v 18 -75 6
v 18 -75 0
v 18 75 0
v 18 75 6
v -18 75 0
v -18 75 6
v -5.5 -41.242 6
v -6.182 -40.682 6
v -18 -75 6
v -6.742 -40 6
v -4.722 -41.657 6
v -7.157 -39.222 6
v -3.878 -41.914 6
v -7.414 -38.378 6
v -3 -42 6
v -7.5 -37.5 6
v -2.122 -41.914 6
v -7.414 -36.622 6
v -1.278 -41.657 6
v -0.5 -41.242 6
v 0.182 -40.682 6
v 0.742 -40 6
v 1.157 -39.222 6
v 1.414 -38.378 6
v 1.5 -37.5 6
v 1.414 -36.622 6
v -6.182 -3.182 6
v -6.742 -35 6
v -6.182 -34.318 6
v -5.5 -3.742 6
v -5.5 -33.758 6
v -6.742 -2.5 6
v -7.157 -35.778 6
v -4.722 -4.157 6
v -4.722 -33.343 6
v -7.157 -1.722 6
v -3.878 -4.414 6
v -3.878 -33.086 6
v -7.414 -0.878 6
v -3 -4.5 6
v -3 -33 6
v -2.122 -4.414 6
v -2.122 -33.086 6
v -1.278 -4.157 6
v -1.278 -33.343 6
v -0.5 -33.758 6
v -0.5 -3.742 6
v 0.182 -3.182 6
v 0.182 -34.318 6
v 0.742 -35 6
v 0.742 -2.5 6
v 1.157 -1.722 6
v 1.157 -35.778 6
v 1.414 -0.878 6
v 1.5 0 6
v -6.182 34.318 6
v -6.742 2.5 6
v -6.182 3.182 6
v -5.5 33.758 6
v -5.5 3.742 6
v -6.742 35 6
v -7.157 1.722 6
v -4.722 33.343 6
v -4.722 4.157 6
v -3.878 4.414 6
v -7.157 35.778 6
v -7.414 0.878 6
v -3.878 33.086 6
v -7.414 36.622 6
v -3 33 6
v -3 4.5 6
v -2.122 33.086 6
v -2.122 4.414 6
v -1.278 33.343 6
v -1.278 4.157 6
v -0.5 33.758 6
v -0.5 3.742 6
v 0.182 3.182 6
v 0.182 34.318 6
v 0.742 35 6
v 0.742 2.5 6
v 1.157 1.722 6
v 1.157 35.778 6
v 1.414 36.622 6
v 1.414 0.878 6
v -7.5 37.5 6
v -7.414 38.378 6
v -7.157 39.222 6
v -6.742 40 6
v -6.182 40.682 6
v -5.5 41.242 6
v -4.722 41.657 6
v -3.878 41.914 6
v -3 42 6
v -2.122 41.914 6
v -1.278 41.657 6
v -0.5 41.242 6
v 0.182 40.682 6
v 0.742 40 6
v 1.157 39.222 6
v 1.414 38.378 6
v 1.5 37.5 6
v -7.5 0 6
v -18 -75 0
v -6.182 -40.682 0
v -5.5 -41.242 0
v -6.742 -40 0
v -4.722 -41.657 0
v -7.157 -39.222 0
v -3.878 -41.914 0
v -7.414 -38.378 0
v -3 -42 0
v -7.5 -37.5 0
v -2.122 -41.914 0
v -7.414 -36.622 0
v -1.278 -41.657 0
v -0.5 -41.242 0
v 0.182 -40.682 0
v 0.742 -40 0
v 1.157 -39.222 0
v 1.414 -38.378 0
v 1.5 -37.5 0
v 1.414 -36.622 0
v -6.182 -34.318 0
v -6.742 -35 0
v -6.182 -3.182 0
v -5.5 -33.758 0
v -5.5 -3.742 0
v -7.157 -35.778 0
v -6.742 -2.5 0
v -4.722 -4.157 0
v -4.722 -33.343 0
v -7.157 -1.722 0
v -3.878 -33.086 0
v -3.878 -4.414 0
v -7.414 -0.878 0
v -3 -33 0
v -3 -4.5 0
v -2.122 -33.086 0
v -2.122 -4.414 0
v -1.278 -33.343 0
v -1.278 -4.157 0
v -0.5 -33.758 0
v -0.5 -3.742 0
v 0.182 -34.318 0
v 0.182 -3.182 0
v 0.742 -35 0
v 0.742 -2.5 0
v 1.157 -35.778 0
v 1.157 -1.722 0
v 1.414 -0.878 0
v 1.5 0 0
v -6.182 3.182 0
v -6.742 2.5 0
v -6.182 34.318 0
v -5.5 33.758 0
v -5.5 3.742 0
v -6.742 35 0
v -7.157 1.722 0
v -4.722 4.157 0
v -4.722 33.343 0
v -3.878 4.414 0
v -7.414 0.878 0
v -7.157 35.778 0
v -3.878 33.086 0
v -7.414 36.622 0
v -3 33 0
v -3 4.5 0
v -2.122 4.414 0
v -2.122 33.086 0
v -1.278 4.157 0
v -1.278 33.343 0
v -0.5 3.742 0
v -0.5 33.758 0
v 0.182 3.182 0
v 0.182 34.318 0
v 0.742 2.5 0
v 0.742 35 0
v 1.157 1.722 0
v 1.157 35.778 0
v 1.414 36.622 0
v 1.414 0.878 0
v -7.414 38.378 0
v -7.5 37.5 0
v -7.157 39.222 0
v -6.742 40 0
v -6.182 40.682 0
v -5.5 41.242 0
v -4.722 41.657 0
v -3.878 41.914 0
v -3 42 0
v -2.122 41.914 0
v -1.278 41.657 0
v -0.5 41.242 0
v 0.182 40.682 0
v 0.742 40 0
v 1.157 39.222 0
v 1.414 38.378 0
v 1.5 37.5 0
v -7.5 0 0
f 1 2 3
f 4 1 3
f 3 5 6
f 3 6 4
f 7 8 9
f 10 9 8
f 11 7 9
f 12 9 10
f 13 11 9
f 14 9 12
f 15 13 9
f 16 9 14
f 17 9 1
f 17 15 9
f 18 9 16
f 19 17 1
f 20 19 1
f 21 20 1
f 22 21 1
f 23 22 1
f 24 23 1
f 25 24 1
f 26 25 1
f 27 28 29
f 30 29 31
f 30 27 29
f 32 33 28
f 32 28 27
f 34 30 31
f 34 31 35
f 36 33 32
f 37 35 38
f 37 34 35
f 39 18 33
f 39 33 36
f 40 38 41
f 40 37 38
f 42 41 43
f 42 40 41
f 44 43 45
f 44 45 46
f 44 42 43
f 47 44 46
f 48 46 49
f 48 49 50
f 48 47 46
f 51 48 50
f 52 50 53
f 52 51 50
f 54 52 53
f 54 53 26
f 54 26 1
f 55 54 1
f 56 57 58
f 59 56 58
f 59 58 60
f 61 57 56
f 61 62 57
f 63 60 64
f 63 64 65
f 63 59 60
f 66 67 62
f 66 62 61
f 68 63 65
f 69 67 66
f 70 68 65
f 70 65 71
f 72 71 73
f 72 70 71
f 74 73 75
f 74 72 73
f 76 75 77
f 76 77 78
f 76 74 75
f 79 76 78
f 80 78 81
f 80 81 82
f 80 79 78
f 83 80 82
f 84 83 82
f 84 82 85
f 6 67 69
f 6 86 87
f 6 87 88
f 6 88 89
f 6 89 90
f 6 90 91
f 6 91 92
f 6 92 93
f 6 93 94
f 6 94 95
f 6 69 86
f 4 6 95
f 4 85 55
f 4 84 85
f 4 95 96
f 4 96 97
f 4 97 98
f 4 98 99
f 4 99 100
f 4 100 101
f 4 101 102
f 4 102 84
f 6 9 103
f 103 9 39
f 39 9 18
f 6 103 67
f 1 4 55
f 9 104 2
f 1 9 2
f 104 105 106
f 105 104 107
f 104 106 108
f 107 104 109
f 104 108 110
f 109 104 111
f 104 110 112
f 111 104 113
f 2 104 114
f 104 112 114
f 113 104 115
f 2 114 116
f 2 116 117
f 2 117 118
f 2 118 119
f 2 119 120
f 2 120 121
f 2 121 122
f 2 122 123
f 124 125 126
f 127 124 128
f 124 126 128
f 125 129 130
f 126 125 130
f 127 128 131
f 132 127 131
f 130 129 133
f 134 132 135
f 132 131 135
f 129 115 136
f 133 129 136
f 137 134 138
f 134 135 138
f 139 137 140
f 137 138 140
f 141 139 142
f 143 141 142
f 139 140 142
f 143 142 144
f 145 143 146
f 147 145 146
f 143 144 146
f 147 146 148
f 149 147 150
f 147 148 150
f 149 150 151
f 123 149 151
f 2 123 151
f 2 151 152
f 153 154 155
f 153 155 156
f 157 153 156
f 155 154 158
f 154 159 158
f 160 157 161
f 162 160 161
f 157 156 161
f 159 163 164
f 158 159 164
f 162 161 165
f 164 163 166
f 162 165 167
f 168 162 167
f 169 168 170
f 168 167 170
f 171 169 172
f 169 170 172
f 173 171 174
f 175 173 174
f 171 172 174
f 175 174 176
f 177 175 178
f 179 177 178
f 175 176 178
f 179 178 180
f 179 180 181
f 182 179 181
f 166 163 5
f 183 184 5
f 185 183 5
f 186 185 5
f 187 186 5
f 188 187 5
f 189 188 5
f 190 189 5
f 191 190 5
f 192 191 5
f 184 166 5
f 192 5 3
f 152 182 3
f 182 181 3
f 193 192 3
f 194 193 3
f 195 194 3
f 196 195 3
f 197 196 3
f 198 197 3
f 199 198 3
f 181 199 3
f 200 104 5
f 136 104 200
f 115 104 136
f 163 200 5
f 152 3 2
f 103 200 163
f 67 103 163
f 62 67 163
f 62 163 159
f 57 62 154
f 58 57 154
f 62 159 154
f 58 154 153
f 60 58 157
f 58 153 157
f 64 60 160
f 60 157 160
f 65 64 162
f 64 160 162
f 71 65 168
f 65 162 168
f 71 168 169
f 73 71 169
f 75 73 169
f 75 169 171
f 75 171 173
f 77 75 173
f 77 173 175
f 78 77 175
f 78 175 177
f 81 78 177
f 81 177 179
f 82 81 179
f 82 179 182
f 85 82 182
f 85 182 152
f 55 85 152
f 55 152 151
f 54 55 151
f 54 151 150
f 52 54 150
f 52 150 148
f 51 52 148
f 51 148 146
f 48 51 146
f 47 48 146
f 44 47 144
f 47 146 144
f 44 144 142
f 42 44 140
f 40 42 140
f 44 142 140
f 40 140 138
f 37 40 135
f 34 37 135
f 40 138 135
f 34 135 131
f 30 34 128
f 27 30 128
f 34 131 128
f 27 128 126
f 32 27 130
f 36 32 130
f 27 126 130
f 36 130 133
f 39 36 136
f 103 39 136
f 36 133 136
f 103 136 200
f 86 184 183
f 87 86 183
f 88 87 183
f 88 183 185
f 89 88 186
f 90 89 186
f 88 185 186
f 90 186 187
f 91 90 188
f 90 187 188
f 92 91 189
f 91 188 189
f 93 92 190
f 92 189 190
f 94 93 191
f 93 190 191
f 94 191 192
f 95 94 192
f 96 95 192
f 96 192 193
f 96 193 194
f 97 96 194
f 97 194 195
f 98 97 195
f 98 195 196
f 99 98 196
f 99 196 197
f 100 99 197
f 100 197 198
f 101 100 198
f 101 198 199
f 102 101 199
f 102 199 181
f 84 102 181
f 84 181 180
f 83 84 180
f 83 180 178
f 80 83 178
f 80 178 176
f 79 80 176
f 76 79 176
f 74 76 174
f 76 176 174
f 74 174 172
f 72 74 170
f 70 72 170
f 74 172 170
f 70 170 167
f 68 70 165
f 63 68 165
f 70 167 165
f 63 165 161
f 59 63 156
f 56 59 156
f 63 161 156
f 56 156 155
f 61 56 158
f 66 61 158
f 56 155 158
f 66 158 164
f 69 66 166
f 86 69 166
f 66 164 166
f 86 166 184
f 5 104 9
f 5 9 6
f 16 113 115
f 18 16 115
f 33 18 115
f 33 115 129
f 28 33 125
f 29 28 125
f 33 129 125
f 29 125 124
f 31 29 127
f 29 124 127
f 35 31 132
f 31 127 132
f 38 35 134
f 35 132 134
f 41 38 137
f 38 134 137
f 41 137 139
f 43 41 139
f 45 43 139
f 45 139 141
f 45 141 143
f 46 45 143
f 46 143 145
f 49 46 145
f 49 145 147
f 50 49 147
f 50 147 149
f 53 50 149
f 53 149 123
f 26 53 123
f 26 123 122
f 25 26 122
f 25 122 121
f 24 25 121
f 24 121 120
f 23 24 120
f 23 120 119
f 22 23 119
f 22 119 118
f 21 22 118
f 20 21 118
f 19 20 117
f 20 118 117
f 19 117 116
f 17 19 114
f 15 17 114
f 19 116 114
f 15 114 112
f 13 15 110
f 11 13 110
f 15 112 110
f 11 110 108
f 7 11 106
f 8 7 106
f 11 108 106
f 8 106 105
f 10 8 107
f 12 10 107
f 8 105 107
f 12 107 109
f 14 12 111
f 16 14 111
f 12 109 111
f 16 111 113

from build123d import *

# Parameters (mm, degrees)
SKETCH1_W            = 36
SKETCH1_H            = 150
BOSS_EXTRUDE1_DEPTH  = 6
M8_CLEARANCE_HOLE1_D = 9


with BuildPart() as part:
    # Sketch1 → Boss-Extrude1 (new body)
    with BuildSketch(Plane.XY):
        Rectangle(SKETCH1_W, SKETCH1_H)
    extrude(amount=BOSS_EXTRUDE1_DEPTH)

    # M8 Clearance Hole1 (through all)
    with Locations(Plane.XY.offset(6)):
        with Locations((-3, 37.5), (-3, 0), (-3, -37.5)):
            Hole(M8_CLEARANCE_HOLE1_D / 2)


solid = part.part
